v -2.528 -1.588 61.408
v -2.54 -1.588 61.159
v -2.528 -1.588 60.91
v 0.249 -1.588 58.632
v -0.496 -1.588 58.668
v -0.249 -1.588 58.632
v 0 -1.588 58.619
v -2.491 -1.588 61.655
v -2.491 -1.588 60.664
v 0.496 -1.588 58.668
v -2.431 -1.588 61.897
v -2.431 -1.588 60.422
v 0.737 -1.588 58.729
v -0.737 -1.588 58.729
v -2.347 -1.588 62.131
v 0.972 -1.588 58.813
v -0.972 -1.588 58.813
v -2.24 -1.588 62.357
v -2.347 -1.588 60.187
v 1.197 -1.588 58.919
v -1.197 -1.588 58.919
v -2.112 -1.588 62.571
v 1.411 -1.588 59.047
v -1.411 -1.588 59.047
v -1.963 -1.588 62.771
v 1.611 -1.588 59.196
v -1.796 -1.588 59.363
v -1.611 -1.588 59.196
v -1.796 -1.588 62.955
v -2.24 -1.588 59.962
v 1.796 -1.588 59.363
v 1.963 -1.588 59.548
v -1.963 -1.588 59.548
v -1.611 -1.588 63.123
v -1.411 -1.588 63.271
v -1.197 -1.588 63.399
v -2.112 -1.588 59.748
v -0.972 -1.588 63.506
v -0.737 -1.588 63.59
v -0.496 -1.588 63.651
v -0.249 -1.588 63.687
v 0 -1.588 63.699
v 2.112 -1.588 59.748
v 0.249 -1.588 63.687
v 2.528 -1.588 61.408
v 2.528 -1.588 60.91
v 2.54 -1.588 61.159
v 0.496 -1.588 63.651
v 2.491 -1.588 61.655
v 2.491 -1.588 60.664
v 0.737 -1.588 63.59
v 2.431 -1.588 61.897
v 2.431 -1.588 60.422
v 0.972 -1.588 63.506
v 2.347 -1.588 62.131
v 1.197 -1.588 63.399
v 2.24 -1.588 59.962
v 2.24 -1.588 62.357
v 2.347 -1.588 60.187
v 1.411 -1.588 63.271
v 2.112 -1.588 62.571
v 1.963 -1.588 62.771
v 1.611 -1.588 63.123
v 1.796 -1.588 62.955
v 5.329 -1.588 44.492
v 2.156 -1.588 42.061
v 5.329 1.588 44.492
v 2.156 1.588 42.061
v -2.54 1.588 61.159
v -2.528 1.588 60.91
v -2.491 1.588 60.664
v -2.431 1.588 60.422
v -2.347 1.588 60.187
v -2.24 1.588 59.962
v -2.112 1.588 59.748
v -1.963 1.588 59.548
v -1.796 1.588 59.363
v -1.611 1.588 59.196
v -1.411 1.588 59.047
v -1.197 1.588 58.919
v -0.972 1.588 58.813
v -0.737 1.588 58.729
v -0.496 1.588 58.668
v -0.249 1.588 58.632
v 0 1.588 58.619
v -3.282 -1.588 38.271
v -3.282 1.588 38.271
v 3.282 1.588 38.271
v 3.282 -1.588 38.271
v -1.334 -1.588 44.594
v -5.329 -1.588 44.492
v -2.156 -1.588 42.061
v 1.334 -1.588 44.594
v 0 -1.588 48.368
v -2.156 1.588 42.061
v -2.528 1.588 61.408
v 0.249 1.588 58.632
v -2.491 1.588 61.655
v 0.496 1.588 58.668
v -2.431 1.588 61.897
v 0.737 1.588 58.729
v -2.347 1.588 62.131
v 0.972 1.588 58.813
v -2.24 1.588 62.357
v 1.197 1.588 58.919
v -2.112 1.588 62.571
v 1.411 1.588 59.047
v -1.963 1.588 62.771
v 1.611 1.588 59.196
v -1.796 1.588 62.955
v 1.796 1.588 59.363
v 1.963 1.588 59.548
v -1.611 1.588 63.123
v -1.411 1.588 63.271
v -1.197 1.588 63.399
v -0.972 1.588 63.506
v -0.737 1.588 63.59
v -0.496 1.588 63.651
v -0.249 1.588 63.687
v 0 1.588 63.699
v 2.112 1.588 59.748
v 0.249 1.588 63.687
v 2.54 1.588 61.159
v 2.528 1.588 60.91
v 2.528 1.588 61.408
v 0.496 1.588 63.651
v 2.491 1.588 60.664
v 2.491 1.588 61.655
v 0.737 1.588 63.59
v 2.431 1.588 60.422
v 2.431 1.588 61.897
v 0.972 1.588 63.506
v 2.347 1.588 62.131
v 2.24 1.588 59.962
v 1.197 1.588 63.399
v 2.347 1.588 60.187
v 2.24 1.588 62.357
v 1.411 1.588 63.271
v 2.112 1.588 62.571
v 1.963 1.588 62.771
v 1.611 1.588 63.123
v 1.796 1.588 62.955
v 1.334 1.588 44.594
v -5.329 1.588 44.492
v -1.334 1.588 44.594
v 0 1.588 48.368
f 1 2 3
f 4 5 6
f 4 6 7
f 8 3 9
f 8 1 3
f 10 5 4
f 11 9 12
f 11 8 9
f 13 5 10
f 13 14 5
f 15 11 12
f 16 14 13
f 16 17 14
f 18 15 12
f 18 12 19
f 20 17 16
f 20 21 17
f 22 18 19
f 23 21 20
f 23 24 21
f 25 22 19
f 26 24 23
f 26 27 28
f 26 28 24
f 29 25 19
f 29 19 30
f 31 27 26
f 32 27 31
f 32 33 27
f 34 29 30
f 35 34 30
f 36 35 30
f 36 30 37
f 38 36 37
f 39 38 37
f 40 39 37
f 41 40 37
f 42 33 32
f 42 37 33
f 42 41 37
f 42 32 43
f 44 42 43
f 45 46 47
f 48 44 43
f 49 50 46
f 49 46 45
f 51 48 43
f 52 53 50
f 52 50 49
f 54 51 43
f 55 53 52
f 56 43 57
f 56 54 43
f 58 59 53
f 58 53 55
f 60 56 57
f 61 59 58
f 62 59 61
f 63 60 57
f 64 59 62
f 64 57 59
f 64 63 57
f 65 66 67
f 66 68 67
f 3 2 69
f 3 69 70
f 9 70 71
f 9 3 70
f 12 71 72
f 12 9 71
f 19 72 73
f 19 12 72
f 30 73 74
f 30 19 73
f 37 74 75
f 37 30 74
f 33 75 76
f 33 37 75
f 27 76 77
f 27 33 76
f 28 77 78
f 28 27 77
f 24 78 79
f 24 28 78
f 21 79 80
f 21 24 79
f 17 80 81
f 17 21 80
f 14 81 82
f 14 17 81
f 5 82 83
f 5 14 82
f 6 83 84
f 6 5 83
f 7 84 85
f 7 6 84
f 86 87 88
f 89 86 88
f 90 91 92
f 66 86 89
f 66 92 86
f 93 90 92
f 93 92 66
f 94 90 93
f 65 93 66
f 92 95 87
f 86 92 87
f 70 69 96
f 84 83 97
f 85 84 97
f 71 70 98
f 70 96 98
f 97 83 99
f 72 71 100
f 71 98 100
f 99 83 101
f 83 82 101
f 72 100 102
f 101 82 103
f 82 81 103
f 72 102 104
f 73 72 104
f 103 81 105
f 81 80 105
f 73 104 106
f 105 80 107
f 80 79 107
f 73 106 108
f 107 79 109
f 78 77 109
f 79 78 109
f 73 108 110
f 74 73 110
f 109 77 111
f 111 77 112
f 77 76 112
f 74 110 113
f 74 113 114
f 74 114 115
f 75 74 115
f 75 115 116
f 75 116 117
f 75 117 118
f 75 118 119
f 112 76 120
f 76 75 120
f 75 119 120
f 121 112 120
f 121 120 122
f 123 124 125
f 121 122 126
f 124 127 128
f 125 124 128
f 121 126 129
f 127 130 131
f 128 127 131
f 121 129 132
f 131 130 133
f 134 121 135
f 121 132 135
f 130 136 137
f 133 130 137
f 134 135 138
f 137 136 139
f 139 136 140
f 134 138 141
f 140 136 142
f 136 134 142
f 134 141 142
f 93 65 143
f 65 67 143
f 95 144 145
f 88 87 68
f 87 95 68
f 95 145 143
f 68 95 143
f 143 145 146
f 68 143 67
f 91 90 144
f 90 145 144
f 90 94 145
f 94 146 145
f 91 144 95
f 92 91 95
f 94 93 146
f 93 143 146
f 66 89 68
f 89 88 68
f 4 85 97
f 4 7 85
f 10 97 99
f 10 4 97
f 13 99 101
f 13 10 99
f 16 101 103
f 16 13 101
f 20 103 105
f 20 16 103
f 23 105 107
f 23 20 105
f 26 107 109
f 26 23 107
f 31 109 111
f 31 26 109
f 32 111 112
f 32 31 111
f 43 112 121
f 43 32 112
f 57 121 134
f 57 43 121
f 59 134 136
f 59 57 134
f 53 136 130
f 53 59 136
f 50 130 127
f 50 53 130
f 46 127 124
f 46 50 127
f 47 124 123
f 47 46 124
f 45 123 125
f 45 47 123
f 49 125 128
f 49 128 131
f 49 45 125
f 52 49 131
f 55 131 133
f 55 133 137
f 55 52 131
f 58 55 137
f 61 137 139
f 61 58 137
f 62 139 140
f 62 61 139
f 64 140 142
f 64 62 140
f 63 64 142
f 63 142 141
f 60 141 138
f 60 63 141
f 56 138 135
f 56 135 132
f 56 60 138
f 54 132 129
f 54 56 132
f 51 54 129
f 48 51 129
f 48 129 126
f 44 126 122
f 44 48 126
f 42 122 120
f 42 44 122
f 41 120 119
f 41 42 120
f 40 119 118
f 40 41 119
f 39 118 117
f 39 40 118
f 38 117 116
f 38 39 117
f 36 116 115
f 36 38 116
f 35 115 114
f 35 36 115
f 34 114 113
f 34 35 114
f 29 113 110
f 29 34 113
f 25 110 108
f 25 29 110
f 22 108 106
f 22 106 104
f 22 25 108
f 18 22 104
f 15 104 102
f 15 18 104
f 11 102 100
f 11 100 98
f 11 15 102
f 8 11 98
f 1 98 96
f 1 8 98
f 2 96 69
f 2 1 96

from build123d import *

# Parameters (mm, degrees)
F1_DEPTH = 1.5875


with BuildPart() as f1:
    # F0 (on Front) → F1 (new body, symmetric)
    with BuildSketch(Plane.XZ):
        Polygon((-3.28168, 38.27145), (-0.10668, 38.27145), (3.28168, 38.27145), (2.15646, 42.06113), (5.32892, 44.49191), (1.3335, 44.59351), (0, 48.36795), (-1.3335, 44.59351), (-5.32892, 44.49191), (-2.15646, 42.06113), align=None)
        with BuildLine():
            ThreePointArc((2.54, 61.15939), (0, 63.69939), (-2.54, 61.15939))
            ThreePointArc((-2.54, 61.15939), (-1.796051, 59.363339), (0, 58.61939))
            ThreePointArc((0, 58.61939), (1.796051, 59.363339), (2.54, 61.15939))
        make_face()
    extrude(amount=F1_DEPTH, both=True)


solid = f1.part
